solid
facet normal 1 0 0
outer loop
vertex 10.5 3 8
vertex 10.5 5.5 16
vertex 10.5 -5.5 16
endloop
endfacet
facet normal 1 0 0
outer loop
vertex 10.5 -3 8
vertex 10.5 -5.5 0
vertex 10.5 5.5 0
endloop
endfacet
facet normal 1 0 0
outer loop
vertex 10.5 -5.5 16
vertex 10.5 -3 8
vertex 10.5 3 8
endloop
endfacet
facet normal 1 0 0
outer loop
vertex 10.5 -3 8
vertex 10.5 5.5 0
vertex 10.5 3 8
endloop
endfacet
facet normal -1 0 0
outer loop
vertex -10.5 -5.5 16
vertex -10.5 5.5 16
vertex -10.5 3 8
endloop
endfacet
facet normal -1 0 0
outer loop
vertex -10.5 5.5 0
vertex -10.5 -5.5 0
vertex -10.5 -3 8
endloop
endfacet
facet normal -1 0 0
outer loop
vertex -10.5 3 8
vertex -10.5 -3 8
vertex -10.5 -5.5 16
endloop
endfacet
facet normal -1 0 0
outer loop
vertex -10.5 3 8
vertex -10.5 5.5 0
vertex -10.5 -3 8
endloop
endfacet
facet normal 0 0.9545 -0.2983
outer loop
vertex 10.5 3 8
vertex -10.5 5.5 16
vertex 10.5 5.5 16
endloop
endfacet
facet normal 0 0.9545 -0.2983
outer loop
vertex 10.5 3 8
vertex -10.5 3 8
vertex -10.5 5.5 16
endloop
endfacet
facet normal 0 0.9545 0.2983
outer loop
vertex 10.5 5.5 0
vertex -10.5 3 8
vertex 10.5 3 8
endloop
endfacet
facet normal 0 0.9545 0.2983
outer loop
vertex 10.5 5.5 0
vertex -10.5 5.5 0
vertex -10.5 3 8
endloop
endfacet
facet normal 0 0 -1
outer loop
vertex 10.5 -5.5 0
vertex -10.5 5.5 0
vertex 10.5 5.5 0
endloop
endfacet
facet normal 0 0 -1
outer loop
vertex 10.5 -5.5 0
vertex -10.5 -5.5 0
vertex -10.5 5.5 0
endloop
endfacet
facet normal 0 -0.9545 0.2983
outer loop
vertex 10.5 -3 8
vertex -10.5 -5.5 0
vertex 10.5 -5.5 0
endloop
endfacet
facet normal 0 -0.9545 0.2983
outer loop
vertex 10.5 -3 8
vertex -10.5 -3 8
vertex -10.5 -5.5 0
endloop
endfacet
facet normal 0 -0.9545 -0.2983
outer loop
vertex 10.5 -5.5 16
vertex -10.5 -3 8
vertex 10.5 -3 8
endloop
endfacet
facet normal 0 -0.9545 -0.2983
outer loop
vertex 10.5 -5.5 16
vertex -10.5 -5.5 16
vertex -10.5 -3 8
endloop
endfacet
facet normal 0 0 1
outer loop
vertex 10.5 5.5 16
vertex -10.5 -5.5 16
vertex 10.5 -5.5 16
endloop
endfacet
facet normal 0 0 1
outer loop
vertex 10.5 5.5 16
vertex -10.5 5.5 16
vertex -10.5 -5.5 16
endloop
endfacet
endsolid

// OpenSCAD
// Butterfly key for the frame joint (print 1 of each). Push the platen key up
// through the floor and drop the back key into the back joint block from the
// top, then fit the four M3 x 16 screws + nuts across the seam.
//
//   -D 'which="platen"' or -D 'which="back"'
//
// Print standing on one flat end face (as modelled), no supports: the flared
// sides lean only ~17 degrees from vertical.

include <common.scad>

which = "platen";
h = which == "platen" ? paper_z : back_key_h;

// key length (across the seam) becomes Z, key height becomes X
translate([0, 0, key_l / 2]) rotate([0, -90, 0]) linear_extrude(h, center = true) key_profile(0);
